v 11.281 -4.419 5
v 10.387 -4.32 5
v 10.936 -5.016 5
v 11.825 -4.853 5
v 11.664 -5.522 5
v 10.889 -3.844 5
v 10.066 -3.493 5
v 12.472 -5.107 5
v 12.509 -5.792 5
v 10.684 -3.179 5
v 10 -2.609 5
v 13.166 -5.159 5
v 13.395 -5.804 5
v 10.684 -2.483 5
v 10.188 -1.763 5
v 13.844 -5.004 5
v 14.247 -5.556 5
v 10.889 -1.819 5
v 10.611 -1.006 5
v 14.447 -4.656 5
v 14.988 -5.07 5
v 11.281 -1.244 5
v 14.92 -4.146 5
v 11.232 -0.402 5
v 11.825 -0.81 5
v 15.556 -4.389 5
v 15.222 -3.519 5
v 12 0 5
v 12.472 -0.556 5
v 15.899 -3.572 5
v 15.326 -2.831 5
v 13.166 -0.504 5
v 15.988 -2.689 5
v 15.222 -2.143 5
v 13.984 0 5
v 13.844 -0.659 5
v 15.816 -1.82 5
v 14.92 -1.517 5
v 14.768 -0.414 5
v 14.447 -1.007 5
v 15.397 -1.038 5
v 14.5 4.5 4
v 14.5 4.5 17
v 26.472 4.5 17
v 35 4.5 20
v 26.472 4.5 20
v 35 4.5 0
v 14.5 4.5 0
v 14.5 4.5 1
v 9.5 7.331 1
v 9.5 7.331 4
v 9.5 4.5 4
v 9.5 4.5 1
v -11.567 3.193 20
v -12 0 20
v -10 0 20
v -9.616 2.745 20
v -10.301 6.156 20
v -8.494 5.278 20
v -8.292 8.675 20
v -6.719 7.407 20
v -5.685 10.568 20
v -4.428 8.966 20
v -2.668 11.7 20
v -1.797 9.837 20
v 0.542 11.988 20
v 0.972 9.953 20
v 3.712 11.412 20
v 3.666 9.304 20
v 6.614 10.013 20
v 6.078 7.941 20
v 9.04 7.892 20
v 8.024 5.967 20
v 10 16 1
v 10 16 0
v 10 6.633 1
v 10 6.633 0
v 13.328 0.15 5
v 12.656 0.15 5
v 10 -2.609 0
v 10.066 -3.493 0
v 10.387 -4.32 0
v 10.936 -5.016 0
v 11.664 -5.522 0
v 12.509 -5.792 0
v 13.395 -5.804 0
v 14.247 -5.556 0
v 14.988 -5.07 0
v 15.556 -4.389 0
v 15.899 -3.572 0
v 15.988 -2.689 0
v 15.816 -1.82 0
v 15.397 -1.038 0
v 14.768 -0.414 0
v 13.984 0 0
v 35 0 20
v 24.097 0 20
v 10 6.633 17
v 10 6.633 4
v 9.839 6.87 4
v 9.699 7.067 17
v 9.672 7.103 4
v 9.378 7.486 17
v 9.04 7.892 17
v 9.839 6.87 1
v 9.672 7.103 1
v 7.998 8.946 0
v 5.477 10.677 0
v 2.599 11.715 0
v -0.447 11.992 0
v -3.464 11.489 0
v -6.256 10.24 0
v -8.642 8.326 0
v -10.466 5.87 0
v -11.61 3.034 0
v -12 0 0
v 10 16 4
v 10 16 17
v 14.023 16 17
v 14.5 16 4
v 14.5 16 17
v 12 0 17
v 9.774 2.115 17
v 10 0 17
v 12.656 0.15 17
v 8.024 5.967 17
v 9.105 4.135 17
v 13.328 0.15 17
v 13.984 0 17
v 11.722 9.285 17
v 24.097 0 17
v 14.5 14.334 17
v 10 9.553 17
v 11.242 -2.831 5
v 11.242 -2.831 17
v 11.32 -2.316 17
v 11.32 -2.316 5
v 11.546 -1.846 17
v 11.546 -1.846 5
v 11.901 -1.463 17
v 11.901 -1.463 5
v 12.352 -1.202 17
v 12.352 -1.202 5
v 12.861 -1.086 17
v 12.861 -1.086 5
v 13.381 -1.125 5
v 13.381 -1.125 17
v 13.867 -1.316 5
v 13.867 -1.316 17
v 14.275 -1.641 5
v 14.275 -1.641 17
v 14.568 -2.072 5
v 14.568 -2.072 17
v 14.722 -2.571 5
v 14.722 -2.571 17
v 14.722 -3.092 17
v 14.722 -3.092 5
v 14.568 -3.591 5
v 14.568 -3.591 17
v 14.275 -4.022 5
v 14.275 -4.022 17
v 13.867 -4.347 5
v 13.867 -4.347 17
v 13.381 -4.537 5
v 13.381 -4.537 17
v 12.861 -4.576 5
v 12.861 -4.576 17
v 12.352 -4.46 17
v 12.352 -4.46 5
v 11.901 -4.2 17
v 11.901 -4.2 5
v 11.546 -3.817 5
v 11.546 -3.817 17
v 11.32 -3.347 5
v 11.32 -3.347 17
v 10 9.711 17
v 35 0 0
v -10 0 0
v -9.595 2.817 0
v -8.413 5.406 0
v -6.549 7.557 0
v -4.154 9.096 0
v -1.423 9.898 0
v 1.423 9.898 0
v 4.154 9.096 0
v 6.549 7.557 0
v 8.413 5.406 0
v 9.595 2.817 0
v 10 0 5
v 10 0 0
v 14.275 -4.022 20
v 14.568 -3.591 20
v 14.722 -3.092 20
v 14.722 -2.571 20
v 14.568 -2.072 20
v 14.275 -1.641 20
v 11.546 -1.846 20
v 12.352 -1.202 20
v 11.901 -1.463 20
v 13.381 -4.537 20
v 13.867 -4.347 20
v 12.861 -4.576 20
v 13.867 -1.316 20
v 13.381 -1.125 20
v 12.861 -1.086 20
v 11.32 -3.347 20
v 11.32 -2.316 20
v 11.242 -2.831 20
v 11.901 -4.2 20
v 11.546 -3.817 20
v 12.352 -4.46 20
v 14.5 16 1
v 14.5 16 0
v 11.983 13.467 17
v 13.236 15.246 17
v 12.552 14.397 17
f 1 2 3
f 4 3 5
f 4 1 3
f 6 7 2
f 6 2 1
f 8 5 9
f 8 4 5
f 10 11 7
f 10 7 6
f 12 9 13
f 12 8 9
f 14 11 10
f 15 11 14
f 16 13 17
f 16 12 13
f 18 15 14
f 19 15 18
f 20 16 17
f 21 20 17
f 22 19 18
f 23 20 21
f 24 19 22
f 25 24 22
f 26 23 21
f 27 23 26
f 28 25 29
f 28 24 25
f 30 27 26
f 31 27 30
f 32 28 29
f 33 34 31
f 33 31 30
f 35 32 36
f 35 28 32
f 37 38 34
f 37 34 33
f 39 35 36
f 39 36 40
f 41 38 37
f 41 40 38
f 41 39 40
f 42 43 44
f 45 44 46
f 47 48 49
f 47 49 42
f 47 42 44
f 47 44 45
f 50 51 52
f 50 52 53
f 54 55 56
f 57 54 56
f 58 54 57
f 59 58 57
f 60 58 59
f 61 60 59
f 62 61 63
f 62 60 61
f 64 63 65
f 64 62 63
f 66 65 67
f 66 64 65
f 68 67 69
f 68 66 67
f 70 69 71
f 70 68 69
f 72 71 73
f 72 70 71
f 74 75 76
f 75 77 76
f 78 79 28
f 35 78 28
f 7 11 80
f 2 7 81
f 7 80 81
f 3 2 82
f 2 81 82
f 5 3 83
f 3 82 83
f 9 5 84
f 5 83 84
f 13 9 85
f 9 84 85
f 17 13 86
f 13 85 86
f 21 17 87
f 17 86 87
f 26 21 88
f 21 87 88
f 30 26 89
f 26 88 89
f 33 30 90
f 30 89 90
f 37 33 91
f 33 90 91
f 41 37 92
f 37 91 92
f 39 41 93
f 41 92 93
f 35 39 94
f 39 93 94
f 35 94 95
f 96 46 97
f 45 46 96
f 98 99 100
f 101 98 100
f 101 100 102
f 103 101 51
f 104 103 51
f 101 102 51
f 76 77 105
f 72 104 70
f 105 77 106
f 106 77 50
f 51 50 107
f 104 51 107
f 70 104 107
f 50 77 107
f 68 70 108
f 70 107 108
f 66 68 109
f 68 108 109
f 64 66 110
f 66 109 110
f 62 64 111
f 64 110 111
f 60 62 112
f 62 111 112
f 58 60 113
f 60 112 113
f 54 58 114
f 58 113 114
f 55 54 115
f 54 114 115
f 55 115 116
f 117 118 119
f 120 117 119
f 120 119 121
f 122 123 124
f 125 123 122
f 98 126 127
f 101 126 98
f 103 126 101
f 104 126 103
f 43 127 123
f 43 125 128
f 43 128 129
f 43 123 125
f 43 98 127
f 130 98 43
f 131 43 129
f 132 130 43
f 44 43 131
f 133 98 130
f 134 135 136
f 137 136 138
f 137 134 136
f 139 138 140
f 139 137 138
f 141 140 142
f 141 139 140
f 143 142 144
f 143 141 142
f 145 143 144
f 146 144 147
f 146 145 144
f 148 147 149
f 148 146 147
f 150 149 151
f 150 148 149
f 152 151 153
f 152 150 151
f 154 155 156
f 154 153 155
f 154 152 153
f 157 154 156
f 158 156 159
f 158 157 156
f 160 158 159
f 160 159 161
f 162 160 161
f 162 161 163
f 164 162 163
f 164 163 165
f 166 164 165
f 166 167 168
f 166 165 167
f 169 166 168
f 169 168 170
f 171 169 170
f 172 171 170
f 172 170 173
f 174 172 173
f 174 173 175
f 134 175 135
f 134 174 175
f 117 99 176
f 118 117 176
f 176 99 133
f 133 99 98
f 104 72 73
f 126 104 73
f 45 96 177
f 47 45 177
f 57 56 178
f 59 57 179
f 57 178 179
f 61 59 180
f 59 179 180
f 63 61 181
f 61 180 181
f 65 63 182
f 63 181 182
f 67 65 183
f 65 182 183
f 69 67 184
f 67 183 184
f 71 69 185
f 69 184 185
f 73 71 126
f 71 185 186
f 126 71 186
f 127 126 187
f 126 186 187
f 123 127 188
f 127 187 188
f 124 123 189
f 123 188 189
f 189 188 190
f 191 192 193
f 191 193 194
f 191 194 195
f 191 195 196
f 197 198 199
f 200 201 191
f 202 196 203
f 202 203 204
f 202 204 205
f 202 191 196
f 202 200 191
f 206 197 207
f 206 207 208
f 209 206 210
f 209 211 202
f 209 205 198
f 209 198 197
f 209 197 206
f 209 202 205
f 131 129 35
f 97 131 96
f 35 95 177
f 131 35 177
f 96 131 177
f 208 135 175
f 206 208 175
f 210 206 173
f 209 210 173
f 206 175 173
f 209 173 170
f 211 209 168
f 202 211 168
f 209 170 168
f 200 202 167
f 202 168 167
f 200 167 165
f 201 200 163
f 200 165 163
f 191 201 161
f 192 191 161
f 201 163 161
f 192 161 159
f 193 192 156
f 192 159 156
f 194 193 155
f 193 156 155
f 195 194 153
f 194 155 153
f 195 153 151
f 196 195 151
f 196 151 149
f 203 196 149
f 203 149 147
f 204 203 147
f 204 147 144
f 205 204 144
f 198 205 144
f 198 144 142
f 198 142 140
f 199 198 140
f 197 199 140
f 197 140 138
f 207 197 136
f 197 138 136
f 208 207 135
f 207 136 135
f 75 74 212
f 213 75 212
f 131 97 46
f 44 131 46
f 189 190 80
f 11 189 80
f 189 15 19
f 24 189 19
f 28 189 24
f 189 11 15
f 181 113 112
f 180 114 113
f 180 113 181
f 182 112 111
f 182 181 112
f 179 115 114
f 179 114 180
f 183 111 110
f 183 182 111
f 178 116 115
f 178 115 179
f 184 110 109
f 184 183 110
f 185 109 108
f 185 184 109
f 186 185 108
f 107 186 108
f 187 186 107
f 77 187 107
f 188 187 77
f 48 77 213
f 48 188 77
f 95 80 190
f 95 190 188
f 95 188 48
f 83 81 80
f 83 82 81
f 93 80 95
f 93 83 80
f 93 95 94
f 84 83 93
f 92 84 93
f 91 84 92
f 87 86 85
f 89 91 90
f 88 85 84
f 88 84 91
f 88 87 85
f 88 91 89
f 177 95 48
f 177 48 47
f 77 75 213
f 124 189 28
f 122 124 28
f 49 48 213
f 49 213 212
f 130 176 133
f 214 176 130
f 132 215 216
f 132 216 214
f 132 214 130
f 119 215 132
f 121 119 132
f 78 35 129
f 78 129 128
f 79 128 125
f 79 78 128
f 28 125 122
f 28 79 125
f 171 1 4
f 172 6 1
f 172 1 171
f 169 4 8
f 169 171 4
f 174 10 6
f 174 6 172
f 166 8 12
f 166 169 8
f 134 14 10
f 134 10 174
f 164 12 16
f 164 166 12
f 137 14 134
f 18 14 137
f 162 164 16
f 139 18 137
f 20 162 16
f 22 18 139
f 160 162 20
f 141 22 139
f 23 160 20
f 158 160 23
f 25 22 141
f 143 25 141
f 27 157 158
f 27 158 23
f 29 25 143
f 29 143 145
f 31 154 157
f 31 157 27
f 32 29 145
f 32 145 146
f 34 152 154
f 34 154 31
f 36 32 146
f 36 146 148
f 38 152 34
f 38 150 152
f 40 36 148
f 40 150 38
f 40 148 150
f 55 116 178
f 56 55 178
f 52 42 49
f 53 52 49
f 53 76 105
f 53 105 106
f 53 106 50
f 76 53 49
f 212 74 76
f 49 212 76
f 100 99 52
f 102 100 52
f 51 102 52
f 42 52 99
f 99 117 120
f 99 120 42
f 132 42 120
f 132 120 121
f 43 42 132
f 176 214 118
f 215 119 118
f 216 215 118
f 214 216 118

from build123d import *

# Parameters (mm, degrees)
BOSS_EXTRUDE1_DEPTH = 20
SKETCH7_R           = 1.75
BOSS_EXTRUDE5_DEPTH = 20
BOSS_EXTRUDE6_DEPTH = 5
SKETCH8_W           = 25
SKETCH8_H           = 20
BOSS_EXTRUDE7_DEPTH = 4.5
SKETCH9_W           = 4.5
SKETCH9_H           = 20
BOSS_EXTRUDE8_DEPTH = 16
SKETCH10_R          = 1.75
CUT_EXTRUDE1_DEPTH  = 3
SKETCH12_R          = 1.75
BOSS_EXTRUDE9_DEPTH = 3
SKETCH14_R          = 3
SKETCH14_R_2        = 2.333892431
CUT_EXTRUDE3_DEPTH  = 16
CUT_EXTRUDE4_DEPTH  = 3
SKETCH16_W          = 3
SKETCH16_H          = 11.5
CUT_EXTRUDE5_DEPTH  = 5


with BuildPart() as part:
    # Sketch1 → Boss-Extrude1 (new body)
    with BuildSketch(Plane.XY):
        with BuildLine():
            Line((-12, 0), (-10, 0))
            ThreePointArc((-10, 0), (0, 10), (10, 0))
            Line((10, 0), (12, 0))
            ThreePointArc((12, 0), (11.984990613, 0.6), (11.94, 1.198499061))
            ThreePointArc((11.94, 1.198499061), (11.893303563, 1.596662255), (11.833333333, 1.993043457))
            ThreePointArc((11.833333333, 1.993043457), (-1, 11.958260743), (-12, 0))
        make_face()
    extrude(amount=BOSS_EXTRUDE1_DEPTH)



with BuildPart() as body_2:
    # Sketch7 → Boss-Extrude5 (new body)
    with BuildSketch(Plane(origin=(0, 0, 0), x_dir=(-1, 0, 0), z_dir=(0, 0, -1))):
        with Locations((-12.991756156, -2.831328262)):
            Circle(SKETCH7_R)
    extrude(amount=-BOSS_EXTRUDE5_DEPTH)

    # Sketch5 → Boss-Extrude6 (add)
    with BuildSketch(Plane(origin=(0, 0, 0), x_dir=(-1, 0, 0), z_dir=(0, 0, -1))):
        with BuildLine():
            Line((-10, 0), (-10, -2.609078175))
            ThreePointArc((-10, -2.609078175), (-15.372704459, -4.656454335), (-12, 0))
            Line((-12, 0), (-10, 0))
        make_face()
    extrude(amount=-BOSS_EXTRUDE6_DEPTH)


with BuildPart() as part_1:
    add(part.part)

    add(body_2.part)  # Boss-Extrude7 merges body 2
    # Sketch8 → Boss-Extrude7 (add)
    with BuildSketch(Plane(origin=(0, 0, 0), x_dir=(1, 0, 0), z_dir=(0, 1, 0))):
        with Locations((22.5, -10)):
            Rectangle(SKETCH8_W, SKETCH8_H)
    extrude(amount=BOSS_EXTRUDE7_DEPTH)

    # Sketch9 → Boss-Extrude8 (add)
    with BuildSketch(Plane.XZ):
        with Locations((12.25, 10)):
            Rectangle(SKETCH9_W, SKETCH9_H)
    extrude(amount=-BOSS_EXTRUDE8_DEPTH)

    # Sketch10 → Cut-Extrude1 (cut)
    with BuildSketch(Plane.XY.offset(20)):
        with BuildLine():
            Line((10, 0), (24.09729333, 0))
            Line((24.09729333, 0), (26.472308955, 4.5))
            Line((26.472308955, 4.5), (14.5, 4.5))
            Line((14.5, 4.5), (14.5, 16))
            Line((14.5, 16), (14.022774425, 16))
            ThreePointArc((14.022774425, 16), (12.880514361, 14.832204973), (11.982740375, 13.467468681))
            Line((11.982740375, 13.467468681), (10, 9.710722159))
            Line((10, 9.710722159), (10, 6.633249581))
            ThreePointArc((10, 6.633249581), (9.540752339, 7.278327061), (9.039960442, 7.891711805))
            Line((9.039960442, 7.891711805), (8.02434549, 5.967401399))
            ThreePointArc((8.02434549, 5.967401399), (9.493246413, 3.142971929), (10, 0))
        make_face()
        with Locations(Location((12.991756156, -2.831328262, 0), (0, 0, 180))):
            Circle(SKETCH10_R)
    extrude(amount=-CUT_EXTRUDE1_DEPTH, mode=Mode.SUBTRACT)

    # Sketch12 → Boss-Extrude9 (add)
    with BuildSketch(Plane.XY.offset(17)):
        with Locations(Location((12.991756156, -2.831328262, 0), (0, 0, 180))):
            Circle(SKETCH12_R)
    extrude(amount=BOSS_EXTRUDE9_DEPTH)

    # Sketch14 → Cut-Extrude3 (cut)
    with BuildSketch(Plane.XY.offset(5)):
        with Locations((12.991756156, -2.831328262)):
            Circle(SKETCH14_R)
        with Locations((12.991756156, -2.831328262)):
            Circle(SKETCH14_R_2, mode=Mode.SUBTRACT)
    extrude(amount=CUT_EXTRUDE3_DEPTH, mode=Mode.SUBTRACT)

    # Sketch15 → Cut-Extrude4 (cut)
    with BuildSketch(Plane.XY.offset(20)):
        Polygon((9.332134569, 17.011722294), (15.835730862, 16.761583975), (11.722345172, 9.285227553), (9.050959886, 9.701180523), align=None)
    extrude(amount=-CUT_EXTRUDE4_DEPTH, mode=Mode.SUBTRACT)

    # Sketch16 → Cut-Extrude5 (cut)
    with BuildSketch(Plane(origin=(14.5, 0, 0), x_dir=(0, 0, -1), z_dir=(1, 0, 0))):
        with Locations((-2.5, 10.25)):
            Rectangle(SKETCH16_W, SKETCH16_H)
    extrude(amount=-CUT_EXTRUDE5_DEPTH, mode=Mode.SUBTRACT)


solid = part_1.part
